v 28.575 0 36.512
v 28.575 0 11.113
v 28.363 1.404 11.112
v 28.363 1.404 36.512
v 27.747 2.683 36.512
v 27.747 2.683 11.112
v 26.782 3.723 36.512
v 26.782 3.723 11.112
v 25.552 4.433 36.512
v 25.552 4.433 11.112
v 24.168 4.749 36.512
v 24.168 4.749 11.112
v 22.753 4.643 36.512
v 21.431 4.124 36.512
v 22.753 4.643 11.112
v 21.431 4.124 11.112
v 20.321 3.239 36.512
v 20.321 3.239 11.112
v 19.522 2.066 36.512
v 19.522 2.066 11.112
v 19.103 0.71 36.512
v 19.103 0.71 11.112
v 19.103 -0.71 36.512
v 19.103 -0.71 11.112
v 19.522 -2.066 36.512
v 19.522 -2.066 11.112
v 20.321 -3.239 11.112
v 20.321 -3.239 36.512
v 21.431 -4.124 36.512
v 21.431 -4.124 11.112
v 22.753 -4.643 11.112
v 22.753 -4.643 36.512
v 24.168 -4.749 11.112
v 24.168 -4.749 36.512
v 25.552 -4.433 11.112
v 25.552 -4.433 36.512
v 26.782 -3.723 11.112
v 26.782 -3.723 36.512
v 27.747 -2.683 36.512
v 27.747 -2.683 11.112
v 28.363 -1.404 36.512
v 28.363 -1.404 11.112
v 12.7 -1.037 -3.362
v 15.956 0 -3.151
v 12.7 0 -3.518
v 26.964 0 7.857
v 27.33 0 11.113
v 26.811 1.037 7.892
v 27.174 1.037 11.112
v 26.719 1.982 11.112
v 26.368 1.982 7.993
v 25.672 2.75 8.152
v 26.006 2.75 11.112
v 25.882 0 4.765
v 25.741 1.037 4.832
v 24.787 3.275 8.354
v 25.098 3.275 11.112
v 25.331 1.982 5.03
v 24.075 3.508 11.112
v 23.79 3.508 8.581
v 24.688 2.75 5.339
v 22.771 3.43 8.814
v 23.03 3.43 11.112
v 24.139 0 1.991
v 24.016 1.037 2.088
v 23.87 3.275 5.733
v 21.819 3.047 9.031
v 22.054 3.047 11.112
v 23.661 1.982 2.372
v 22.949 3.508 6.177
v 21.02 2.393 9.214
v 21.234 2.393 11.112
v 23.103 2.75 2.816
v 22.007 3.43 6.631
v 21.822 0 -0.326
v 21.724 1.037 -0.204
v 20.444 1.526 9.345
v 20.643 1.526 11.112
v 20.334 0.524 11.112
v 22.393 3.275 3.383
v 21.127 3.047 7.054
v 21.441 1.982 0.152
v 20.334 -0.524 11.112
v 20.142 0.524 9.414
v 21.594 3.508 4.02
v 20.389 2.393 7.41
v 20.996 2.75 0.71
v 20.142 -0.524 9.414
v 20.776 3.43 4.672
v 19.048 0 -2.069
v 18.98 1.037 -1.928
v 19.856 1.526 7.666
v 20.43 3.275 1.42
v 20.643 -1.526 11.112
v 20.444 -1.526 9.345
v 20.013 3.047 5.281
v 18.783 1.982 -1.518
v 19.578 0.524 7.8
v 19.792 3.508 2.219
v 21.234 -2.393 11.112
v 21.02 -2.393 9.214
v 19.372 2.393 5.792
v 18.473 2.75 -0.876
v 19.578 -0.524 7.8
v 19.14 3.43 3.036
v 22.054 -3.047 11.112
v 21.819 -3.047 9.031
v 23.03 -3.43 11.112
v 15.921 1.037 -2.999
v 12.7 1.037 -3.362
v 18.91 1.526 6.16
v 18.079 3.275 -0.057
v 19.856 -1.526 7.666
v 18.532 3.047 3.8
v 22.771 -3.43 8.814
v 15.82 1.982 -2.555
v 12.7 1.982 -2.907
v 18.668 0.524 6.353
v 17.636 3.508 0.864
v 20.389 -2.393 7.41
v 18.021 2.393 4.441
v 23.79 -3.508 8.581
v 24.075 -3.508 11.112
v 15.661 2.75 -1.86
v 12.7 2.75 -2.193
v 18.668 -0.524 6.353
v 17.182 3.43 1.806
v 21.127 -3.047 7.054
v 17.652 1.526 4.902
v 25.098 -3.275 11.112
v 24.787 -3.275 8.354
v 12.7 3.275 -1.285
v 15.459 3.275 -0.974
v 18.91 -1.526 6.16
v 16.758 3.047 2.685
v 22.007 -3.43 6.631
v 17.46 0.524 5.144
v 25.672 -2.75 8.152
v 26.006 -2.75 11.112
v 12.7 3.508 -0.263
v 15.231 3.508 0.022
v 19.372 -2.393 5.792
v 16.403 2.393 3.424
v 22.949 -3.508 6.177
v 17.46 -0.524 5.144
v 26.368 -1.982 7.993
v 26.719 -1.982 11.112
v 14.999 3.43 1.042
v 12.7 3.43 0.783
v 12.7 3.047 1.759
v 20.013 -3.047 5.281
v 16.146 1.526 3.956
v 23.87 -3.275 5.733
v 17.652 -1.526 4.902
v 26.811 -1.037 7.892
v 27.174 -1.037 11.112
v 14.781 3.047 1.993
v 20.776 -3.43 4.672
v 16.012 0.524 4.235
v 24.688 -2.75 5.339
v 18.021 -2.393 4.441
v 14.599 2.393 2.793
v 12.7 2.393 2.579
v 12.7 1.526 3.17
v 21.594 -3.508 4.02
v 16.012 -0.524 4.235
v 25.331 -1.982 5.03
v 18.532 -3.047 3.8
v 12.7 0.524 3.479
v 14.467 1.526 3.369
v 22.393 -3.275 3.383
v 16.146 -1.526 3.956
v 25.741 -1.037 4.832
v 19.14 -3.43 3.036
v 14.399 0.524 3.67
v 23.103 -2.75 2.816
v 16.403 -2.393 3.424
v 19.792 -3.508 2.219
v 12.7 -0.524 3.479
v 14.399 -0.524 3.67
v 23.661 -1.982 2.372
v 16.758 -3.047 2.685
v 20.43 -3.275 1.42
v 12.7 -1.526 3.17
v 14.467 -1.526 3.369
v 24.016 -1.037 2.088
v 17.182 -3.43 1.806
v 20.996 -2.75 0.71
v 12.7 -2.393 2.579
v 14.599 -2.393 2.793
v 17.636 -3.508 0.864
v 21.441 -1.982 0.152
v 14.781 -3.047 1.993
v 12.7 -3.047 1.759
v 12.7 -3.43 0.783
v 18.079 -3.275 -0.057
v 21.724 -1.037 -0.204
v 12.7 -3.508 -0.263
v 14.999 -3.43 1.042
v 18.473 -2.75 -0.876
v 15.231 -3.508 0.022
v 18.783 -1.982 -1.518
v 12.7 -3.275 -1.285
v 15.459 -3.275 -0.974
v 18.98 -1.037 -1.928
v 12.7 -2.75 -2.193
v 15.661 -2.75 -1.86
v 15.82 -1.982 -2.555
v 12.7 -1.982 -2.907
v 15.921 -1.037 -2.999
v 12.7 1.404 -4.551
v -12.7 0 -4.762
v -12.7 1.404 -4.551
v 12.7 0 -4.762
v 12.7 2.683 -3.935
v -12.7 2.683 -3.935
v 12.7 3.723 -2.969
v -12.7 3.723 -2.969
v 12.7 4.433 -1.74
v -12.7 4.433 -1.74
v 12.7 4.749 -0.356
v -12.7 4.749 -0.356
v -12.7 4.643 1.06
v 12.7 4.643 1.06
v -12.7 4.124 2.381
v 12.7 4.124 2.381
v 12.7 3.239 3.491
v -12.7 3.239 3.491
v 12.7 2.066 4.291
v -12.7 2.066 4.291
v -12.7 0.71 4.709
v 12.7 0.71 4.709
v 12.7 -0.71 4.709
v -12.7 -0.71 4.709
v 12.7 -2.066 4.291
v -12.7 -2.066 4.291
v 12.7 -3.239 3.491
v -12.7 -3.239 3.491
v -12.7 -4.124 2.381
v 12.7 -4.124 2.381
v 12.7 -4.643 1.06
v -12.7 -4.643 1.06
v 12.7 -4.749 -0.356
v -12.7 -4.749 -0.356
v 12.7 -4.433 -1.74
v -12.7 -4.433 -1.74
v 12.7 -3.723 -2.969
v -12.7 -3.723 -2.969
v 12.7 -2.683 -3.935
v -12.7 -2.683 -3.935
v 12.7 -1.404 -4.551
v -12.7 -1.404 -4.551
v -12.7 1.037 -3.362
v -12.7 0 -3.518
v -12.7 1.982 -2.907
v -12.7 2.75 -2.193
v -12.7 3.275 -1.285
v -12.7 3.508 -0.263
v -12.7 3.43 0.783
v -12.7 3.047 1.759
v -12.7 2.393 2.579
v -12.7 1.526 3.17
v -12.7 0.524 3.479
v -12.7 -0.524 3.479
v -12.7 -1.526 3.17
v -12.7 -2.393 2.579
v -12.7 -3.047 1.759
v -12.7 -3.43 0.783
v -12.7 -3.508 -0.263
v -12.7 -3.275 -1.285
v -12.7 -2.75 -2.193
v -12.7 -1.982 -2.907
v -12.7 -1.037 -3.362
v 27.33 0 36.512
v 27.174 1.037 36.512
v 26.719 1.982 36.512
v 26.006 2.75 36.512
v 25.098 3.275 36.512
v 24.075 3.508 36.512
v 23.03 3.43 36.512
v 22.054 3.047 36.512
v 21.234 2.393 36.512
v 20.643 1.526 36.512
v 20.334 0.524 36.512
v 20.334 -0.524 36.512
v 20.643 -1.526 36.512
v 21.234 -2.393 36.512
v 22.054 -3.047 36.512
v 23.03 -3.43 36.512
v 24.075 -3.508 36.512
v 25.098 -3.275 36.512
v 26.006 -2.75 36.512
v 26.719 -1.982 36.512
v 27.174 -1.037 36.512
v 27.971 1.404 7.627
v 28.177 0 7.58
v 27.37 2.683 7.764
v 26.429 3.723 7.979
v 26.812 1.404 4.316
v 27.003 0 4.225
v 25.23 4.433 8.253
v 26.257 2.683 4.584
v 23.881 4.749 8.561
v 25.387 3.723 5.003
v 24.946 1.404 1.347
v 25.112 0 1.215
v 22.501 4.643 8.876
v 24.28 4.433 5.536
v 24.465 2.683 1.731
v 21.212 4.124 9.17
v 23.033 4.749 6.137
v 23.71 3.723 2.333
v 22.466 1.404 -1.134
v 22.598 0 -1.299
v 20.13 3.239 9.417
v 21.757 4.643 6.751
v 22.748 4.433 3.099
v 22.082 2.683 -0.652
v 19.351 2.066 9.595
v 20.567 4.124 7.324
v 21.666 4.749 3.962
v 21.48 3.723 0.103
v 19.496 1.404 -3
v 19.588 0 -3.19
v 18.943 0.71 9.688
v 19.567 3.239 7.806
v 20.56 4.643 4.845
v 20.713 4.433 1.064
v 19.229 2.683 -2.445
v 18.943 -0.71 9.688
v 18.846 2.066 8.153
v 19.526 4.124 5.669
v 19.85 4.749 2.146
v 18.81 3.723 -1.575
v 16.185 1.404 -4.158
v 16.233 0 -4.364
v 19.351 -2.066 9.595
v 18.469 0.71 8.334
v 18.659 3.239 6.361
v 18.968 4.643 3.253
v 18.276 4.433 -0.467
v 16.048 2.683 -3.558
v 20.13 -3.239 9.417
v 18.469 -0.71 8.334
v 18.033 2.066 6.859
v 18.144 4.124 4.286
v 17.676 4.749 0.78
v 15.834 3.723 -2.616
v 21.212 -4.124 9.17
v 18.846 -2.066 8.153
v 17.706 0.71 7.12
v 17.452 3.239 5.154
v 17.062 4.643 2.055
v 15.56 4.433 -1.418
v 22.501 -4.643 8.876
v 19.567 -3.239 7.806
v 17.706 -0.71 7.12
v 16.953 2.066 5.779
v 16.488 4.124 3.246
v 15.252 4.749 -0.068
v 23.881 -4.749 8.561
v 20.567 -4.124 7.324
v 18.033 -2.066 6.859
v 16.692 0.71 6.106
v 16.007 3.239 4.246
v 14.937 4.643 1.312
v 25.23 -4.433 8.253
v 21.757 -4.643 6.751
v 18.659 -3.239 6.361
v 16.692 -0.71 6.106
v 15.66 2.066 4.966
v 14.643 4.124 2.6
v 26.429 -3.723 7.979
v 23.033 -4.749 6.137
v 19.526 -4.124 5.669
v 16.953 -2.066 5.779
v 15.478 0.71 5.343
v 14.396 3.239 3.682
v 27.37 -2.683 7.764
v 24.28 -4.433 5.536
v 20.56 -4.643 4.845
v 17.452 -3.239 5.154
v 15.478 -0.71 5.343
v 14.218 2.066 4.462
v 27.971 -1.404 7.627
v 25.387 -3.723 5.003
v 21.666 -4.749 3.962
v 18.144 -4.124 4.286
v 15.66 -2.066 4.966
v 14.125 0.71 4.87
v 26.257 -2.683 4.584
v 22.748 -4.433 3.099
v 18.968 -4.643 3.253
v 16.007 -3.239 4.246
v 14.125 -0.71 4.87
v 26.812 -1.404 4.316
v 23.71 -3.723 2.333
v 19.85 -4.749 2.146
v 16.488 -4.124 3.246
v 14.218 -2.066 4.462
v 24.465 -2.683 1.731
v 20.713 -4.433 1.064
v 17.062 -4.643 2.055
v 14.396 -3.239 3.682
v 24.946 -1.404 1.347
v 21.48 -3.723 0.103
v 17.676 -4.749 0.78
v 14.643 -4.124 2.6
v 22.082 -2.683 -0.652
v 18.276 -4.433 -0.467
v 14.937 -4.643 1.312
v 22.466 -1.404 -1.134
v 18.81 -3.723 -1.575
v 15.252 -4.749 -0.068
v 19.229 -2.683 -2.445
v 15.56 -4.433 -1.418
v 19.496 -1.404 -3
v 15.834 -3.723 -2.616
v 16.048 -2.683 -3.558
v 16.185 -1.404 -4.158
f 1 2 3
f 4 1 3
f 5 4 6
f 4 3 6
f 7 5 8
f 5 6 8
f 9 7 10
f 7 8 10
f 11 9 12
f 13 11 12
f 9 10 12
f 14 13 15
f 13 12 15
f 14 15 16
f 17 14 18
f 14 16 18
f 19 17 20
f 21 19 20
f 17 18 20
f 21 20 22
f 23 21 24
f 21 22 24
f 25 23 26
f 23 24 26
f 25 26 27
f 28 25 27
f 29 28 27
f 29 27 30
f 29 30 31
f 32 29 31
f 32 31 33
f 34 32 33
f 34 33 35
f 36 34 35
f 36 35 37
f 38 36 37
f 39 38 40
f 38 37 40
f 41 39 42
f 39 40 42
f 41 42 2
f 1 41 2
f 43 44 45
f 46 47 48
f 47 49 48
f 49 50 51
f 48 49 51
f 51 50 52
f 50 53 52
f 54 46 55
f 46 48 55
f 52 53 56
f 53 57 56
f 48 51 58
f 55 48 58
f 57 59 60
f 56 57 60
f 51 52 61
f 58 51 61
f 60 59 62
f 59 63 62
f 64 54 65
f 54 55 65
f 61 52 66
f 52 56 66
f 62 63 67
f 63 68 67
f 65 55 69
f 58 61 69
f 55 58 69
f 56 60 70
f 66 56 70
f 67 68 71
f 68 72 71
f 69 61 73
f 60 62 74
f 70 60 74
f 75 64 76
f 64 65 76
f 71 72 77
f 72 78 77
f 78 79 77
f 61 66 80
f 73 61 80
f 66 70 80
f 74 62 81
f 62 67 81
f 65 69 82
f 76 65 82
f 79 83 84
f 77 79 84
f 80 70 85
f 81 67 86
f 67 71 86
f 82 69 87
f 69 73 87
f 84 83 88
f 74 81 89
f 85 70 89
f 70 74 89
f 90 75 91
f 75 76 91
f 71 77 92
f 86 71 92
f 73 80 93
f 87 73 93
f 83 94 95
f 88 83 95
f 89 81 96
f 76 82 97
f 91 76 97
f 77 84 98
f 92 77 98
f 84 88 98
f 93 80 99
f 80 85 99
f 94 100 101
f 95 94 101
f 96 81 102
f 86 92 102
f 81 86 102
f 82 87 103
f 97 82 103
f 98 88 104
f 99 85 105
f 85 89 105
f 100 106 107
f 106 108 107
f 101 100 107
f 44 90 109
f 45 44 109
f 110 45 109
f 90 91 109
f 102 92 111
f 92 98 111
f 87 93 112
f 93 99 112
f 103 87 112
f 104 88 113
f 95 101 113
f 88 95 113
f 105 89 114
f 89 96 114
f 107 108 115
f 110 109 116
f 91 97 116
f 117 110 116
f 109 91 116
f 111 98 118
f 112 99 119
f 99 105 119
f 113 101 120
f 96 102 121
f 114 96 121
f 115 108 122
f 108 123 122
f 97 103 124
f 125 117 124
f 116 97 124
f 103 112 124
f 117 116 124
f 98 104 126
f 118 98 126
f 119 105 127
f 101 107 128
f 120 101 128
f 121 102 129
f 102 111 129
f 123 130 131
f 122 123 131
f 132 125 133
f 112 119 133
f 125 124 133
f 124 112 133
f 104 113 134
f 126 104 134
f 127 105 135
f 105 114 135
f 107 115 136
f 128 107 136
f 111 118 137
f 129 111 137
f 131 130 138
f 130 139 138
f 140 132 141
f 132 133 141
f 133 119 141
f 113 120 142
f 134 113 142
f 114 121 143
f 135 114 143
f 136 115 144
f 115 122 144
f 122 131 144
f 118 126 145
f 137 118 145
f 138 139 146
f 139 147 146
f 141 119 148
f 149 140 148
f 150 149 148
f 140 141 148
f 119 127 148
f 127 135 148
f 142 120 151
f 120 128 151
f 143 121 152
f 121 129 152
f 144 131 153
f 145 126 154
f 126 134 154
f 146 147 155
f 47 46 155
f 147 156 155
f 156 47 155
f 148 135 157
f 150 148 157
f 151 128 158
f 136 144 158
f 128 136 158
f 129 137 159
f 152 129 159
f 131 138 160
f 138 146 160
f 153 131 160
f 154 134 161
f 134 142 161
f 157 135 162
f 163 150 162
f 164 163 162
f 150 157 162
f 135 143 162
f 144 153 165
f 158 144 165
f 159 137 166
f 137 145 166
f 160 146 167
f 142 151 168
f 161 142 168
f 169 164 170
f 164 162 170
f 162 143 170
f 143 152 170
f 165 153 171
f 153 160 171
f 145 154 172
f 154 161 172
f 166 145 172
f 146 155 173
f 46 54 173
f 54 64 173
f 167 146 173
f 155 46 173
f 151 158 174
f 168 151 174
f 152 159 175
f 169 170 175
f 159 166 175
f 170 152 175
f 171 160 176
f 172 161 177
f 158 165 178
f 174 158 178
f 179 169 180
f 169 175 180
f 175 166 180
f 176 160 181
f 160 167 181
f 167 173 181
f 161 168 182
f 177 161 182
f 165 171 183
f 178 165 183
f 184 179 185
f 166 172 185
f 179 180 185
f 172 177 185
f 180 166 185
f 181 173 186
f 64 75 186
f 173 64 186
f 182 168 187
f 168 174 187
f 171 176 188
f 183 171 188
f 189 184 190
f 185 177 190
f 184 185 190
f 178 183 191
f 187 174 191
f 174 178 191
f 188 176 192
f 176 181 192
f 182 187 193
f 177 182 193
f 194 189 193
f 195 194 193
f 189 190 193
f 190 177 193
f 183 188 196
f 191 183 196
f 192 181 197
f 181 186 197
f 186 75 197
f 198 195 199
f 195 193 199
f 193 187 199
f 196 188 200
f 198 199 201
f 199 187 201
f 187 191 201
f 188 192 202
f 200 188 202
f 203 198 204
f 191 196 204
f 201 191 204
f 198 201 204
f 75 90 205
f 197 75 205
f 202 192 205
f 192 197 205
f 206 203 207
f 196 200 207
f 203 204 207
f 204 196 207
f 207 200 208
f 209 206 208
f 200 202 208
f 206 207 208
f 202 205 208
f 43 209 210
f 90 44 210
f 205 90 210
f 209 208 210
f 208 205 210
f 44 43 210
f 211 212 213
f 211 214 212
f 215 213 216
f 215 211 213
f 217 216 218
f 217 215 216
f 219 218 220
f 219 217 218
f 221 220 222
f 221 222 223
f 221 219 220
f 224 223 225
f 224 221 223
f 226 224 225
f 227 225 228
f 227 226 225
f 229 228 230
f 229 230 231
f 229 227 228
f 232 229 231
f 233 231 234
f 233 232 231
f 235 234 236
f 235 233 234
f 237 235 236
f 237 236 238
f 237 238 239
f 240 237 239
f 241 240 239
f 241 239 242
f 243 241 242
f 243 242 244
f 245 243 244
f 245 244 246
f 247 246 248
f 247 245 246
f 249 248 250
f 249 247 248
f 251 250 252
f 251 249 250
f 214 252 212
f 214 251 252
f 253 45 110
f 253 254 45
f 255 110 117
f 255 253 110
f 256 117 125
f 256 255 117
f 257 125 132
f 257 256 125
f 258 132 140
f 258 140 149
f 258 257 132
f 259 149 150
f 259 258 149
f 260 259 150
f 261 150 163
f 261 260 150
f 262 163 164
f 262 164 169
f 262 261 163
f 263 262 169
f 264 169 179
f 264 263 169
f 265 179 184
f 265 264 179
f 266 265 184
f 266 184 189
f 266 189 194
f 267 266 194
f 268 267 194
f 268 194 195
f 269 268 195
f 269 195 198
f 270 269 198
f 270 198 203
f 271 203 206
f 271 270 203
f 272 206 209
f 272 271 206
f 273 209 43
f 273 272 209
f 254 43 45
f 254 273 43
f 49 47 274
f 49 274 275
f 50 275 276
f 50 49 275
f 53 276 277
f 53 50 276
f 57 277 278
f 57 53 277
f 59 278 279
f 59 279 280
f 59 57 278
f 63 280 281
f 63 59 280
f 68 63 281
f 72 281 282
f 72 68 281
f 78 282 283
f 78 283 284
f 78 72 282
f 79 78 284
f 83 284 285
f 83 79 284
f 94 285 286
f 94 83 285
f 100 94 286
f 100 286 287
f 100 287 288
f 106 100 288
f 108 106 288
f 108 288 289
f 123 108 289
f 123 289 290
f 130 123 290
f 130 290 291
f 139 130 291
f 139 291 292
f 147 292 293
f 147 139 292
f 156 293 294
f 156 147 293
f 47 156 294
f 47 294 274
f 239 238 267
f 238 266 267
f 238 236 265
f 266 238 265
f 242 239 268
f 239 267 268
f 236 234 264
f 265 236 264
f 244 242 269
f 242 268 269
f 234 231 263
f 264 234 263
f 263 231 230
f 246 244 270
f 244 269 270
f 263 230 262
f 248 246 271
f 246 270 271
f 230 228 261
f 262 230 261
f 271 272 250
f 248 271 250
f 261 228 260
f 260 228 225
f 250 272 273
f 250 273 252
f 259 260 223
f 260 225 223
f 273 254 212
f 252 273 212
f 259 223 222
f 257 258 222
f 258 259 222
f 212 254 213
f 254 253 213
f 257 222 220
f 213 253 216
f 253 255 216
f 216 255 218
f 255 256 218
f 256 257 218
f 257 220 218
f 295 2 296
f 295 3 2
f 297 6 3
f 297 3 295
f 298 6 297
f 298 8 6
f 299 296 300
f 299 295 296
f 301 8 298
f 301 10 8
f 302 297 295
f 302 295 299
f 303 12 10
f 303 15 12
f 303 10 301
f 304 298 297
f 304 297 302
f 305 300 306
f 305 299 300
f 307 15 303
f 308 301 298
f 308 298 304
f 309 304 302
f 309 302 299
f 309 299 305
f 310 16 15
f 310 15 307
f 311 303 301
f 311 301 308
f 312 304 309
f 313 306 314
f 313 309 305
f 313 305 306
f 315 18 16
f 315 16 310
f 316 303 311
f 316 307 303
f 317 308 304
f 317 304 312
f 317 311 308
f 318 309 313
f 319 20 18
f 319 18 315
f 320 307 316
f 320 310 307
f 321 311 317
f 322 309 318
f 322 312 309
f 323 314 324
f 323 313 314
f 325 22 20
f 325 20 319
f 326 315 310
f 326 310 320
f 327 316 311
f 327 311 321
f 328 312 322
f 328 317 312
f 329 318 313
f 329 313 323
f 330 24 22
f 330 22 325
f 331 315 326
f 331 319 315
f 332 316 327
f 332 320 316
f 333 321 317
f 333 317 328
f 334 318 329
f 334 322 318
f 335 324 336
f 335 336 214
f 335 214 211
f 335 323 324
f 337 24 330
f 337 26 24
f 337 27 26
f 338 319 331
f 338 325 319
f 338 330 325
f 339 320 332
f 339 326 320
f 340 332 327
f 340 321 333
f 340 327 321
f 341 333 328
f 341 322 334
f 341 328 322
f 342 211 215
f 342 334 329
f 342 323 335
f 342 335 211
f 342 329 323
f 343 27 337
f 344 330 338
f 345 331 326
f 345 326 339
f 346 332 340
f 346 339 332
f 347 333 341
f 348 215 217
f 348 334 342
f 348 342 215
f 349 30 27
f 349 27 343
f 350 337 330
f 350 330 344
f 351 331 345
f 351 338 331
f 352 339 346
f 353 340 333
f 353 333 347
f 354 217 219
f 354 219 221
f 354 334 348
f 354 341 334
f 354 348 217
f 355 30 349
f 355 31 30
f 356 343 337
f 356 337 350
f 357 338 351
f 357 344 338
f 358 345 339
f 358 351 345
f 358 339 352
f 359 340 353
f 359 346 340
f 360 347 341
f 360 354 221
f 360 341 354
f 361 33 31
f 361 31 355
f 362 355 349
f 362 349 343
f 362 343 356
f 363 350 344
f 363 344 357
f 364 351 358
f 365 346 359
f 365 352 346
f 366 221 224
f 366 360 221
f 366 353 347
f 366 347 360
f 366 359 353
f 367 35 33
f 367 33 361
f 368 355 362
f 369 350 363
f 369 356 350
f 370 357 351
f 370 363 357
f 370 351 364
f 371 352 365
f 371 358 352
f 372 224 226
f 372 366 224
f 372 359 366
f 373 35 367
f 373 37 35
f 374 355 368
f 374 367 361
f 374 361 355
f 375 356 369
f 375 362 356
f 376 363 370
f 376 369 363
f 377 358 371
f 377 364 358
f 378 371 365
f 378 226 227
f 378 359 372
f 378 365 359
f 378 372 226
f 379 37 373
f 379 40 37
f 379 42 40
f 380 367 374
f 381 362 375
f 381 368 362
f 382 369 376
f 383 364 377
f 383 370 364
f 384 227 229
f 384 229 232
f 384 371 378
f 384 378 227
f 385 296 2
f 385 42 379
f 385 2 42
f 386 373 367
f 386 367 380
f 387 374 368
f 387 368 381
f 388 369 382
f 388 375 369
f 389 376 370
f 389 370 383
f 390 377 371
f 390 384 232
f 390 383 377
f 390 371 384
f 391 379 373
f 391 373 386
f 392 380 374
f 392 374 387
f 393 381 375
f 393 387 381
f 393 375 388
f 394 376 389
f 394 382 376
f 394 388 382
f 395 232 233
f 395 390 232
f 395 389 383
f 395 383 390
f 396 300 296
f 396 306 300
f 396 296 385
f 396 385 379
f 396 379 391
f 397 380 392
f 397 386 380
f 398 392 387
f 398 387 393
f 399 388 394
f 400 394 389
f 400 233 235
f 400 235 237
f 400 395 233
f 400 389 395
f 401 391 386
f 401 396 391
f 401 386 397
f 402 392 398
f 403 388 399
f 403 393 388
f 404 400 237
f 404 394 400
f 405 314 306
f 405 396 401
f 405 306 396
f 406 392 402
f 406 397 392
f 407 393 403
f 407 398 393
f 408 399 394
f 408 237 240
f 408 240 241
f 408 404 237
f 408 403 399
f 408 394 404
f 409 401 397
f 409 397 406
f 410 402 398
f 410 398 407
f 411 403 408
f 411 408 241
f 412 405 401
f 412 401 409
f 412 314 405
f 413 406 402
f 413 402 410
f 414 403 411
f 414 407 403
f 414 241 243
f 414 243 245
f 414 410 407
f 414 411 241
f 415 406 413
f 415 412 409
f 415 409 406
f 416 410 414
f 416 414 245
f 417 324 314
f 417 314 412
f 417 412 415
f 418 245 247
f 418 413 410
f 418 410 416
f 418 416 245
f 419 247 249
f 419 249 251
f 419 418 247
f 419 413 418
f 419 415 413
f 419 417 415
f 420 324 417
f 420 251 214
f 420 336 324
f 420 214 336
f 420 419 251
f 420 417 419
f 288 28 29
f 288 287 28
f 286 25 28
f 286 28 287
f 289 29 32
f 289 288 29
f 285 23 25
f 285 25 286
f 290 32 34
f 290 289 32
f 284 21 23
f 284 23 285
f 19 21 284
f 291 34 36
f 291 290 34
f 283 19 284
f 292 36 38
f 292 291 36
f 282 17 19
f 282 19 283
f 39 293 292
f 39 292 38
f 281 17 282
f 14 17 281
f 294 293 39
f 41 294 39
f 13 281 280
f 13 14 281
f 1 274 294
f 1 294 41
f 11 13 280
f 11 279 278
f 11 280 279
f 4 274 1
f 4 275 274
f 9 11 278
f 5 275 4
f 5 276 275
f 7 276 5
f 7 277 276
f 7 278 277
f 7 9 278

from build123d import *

# Parameters (mm, degrees)
SKETCH4_R                = 4.7625
SKETCH4_R_2              = 3.5179
BOSS_EXTRUDE1_DEPTH      = 12.7
BEND_1_OUTLINE_R         = 4.7625
BEND_1_OUTLINE_R_2       = 3.5179
BEND_1_ANGLE             = 90
SKETCH6_R                = 4.7625
SKETCH6_R_2              = 3.5179
POST_BEND_1_LENGTH_DEPTH = 25.4


# Read off the part's stored shape, not the designer's step: Bend 1
with BuildPart() as part:
    # Sketch4 → Boss-Extrude1 (new, symmetric)
    with BuildSketch(Plane(origin=(0, 0, 0), x_dir=(0, 0, -1), z_dir=(1, 0, 0))):
        Circle(SKETCH4_R)
        Circle(SKETCH4_R_2, mode=Mode.SUBTRACT)
    extrude(amount=BOSS_EXTRUDE1_DEPTH, both=True)

    # Bend 1 outline → Bend 1 (revolve)
    with BuildSketch(Plane(origin=(12.7, 0, 11.1125), x_dir=(1, 0, 0), z_dir=(0, 0, 1))):
        with Locations((11.1125, 0)):
            Circle(BEND_1_OUTLINE_R)
        with Locations((11.1125, 0)):
            Circle(BEND_1_OUTLINE_R_2, mode=Mode.SUBTRACT)
    revolve(axis=Axis((12.7, 0, 11.1125), (0, 1, 0)), revolution_arc=BEND_1_ANGLE)

    # Sketch6 → Post Bend 1 Length (add)
    with BuildSketch(Plane.XY.offset(11.1125)):
        with Locations((23.8125, 0)):
            Circle(SKETCH6_R)
        with Locations((23.8125, 0)):
            Circle(SKETCH6_R_2, mode=Mode.SUBTRACT)
    extrude(amount=POST_BEND_1_LENGTH_DEPTH)


solid = part.part
